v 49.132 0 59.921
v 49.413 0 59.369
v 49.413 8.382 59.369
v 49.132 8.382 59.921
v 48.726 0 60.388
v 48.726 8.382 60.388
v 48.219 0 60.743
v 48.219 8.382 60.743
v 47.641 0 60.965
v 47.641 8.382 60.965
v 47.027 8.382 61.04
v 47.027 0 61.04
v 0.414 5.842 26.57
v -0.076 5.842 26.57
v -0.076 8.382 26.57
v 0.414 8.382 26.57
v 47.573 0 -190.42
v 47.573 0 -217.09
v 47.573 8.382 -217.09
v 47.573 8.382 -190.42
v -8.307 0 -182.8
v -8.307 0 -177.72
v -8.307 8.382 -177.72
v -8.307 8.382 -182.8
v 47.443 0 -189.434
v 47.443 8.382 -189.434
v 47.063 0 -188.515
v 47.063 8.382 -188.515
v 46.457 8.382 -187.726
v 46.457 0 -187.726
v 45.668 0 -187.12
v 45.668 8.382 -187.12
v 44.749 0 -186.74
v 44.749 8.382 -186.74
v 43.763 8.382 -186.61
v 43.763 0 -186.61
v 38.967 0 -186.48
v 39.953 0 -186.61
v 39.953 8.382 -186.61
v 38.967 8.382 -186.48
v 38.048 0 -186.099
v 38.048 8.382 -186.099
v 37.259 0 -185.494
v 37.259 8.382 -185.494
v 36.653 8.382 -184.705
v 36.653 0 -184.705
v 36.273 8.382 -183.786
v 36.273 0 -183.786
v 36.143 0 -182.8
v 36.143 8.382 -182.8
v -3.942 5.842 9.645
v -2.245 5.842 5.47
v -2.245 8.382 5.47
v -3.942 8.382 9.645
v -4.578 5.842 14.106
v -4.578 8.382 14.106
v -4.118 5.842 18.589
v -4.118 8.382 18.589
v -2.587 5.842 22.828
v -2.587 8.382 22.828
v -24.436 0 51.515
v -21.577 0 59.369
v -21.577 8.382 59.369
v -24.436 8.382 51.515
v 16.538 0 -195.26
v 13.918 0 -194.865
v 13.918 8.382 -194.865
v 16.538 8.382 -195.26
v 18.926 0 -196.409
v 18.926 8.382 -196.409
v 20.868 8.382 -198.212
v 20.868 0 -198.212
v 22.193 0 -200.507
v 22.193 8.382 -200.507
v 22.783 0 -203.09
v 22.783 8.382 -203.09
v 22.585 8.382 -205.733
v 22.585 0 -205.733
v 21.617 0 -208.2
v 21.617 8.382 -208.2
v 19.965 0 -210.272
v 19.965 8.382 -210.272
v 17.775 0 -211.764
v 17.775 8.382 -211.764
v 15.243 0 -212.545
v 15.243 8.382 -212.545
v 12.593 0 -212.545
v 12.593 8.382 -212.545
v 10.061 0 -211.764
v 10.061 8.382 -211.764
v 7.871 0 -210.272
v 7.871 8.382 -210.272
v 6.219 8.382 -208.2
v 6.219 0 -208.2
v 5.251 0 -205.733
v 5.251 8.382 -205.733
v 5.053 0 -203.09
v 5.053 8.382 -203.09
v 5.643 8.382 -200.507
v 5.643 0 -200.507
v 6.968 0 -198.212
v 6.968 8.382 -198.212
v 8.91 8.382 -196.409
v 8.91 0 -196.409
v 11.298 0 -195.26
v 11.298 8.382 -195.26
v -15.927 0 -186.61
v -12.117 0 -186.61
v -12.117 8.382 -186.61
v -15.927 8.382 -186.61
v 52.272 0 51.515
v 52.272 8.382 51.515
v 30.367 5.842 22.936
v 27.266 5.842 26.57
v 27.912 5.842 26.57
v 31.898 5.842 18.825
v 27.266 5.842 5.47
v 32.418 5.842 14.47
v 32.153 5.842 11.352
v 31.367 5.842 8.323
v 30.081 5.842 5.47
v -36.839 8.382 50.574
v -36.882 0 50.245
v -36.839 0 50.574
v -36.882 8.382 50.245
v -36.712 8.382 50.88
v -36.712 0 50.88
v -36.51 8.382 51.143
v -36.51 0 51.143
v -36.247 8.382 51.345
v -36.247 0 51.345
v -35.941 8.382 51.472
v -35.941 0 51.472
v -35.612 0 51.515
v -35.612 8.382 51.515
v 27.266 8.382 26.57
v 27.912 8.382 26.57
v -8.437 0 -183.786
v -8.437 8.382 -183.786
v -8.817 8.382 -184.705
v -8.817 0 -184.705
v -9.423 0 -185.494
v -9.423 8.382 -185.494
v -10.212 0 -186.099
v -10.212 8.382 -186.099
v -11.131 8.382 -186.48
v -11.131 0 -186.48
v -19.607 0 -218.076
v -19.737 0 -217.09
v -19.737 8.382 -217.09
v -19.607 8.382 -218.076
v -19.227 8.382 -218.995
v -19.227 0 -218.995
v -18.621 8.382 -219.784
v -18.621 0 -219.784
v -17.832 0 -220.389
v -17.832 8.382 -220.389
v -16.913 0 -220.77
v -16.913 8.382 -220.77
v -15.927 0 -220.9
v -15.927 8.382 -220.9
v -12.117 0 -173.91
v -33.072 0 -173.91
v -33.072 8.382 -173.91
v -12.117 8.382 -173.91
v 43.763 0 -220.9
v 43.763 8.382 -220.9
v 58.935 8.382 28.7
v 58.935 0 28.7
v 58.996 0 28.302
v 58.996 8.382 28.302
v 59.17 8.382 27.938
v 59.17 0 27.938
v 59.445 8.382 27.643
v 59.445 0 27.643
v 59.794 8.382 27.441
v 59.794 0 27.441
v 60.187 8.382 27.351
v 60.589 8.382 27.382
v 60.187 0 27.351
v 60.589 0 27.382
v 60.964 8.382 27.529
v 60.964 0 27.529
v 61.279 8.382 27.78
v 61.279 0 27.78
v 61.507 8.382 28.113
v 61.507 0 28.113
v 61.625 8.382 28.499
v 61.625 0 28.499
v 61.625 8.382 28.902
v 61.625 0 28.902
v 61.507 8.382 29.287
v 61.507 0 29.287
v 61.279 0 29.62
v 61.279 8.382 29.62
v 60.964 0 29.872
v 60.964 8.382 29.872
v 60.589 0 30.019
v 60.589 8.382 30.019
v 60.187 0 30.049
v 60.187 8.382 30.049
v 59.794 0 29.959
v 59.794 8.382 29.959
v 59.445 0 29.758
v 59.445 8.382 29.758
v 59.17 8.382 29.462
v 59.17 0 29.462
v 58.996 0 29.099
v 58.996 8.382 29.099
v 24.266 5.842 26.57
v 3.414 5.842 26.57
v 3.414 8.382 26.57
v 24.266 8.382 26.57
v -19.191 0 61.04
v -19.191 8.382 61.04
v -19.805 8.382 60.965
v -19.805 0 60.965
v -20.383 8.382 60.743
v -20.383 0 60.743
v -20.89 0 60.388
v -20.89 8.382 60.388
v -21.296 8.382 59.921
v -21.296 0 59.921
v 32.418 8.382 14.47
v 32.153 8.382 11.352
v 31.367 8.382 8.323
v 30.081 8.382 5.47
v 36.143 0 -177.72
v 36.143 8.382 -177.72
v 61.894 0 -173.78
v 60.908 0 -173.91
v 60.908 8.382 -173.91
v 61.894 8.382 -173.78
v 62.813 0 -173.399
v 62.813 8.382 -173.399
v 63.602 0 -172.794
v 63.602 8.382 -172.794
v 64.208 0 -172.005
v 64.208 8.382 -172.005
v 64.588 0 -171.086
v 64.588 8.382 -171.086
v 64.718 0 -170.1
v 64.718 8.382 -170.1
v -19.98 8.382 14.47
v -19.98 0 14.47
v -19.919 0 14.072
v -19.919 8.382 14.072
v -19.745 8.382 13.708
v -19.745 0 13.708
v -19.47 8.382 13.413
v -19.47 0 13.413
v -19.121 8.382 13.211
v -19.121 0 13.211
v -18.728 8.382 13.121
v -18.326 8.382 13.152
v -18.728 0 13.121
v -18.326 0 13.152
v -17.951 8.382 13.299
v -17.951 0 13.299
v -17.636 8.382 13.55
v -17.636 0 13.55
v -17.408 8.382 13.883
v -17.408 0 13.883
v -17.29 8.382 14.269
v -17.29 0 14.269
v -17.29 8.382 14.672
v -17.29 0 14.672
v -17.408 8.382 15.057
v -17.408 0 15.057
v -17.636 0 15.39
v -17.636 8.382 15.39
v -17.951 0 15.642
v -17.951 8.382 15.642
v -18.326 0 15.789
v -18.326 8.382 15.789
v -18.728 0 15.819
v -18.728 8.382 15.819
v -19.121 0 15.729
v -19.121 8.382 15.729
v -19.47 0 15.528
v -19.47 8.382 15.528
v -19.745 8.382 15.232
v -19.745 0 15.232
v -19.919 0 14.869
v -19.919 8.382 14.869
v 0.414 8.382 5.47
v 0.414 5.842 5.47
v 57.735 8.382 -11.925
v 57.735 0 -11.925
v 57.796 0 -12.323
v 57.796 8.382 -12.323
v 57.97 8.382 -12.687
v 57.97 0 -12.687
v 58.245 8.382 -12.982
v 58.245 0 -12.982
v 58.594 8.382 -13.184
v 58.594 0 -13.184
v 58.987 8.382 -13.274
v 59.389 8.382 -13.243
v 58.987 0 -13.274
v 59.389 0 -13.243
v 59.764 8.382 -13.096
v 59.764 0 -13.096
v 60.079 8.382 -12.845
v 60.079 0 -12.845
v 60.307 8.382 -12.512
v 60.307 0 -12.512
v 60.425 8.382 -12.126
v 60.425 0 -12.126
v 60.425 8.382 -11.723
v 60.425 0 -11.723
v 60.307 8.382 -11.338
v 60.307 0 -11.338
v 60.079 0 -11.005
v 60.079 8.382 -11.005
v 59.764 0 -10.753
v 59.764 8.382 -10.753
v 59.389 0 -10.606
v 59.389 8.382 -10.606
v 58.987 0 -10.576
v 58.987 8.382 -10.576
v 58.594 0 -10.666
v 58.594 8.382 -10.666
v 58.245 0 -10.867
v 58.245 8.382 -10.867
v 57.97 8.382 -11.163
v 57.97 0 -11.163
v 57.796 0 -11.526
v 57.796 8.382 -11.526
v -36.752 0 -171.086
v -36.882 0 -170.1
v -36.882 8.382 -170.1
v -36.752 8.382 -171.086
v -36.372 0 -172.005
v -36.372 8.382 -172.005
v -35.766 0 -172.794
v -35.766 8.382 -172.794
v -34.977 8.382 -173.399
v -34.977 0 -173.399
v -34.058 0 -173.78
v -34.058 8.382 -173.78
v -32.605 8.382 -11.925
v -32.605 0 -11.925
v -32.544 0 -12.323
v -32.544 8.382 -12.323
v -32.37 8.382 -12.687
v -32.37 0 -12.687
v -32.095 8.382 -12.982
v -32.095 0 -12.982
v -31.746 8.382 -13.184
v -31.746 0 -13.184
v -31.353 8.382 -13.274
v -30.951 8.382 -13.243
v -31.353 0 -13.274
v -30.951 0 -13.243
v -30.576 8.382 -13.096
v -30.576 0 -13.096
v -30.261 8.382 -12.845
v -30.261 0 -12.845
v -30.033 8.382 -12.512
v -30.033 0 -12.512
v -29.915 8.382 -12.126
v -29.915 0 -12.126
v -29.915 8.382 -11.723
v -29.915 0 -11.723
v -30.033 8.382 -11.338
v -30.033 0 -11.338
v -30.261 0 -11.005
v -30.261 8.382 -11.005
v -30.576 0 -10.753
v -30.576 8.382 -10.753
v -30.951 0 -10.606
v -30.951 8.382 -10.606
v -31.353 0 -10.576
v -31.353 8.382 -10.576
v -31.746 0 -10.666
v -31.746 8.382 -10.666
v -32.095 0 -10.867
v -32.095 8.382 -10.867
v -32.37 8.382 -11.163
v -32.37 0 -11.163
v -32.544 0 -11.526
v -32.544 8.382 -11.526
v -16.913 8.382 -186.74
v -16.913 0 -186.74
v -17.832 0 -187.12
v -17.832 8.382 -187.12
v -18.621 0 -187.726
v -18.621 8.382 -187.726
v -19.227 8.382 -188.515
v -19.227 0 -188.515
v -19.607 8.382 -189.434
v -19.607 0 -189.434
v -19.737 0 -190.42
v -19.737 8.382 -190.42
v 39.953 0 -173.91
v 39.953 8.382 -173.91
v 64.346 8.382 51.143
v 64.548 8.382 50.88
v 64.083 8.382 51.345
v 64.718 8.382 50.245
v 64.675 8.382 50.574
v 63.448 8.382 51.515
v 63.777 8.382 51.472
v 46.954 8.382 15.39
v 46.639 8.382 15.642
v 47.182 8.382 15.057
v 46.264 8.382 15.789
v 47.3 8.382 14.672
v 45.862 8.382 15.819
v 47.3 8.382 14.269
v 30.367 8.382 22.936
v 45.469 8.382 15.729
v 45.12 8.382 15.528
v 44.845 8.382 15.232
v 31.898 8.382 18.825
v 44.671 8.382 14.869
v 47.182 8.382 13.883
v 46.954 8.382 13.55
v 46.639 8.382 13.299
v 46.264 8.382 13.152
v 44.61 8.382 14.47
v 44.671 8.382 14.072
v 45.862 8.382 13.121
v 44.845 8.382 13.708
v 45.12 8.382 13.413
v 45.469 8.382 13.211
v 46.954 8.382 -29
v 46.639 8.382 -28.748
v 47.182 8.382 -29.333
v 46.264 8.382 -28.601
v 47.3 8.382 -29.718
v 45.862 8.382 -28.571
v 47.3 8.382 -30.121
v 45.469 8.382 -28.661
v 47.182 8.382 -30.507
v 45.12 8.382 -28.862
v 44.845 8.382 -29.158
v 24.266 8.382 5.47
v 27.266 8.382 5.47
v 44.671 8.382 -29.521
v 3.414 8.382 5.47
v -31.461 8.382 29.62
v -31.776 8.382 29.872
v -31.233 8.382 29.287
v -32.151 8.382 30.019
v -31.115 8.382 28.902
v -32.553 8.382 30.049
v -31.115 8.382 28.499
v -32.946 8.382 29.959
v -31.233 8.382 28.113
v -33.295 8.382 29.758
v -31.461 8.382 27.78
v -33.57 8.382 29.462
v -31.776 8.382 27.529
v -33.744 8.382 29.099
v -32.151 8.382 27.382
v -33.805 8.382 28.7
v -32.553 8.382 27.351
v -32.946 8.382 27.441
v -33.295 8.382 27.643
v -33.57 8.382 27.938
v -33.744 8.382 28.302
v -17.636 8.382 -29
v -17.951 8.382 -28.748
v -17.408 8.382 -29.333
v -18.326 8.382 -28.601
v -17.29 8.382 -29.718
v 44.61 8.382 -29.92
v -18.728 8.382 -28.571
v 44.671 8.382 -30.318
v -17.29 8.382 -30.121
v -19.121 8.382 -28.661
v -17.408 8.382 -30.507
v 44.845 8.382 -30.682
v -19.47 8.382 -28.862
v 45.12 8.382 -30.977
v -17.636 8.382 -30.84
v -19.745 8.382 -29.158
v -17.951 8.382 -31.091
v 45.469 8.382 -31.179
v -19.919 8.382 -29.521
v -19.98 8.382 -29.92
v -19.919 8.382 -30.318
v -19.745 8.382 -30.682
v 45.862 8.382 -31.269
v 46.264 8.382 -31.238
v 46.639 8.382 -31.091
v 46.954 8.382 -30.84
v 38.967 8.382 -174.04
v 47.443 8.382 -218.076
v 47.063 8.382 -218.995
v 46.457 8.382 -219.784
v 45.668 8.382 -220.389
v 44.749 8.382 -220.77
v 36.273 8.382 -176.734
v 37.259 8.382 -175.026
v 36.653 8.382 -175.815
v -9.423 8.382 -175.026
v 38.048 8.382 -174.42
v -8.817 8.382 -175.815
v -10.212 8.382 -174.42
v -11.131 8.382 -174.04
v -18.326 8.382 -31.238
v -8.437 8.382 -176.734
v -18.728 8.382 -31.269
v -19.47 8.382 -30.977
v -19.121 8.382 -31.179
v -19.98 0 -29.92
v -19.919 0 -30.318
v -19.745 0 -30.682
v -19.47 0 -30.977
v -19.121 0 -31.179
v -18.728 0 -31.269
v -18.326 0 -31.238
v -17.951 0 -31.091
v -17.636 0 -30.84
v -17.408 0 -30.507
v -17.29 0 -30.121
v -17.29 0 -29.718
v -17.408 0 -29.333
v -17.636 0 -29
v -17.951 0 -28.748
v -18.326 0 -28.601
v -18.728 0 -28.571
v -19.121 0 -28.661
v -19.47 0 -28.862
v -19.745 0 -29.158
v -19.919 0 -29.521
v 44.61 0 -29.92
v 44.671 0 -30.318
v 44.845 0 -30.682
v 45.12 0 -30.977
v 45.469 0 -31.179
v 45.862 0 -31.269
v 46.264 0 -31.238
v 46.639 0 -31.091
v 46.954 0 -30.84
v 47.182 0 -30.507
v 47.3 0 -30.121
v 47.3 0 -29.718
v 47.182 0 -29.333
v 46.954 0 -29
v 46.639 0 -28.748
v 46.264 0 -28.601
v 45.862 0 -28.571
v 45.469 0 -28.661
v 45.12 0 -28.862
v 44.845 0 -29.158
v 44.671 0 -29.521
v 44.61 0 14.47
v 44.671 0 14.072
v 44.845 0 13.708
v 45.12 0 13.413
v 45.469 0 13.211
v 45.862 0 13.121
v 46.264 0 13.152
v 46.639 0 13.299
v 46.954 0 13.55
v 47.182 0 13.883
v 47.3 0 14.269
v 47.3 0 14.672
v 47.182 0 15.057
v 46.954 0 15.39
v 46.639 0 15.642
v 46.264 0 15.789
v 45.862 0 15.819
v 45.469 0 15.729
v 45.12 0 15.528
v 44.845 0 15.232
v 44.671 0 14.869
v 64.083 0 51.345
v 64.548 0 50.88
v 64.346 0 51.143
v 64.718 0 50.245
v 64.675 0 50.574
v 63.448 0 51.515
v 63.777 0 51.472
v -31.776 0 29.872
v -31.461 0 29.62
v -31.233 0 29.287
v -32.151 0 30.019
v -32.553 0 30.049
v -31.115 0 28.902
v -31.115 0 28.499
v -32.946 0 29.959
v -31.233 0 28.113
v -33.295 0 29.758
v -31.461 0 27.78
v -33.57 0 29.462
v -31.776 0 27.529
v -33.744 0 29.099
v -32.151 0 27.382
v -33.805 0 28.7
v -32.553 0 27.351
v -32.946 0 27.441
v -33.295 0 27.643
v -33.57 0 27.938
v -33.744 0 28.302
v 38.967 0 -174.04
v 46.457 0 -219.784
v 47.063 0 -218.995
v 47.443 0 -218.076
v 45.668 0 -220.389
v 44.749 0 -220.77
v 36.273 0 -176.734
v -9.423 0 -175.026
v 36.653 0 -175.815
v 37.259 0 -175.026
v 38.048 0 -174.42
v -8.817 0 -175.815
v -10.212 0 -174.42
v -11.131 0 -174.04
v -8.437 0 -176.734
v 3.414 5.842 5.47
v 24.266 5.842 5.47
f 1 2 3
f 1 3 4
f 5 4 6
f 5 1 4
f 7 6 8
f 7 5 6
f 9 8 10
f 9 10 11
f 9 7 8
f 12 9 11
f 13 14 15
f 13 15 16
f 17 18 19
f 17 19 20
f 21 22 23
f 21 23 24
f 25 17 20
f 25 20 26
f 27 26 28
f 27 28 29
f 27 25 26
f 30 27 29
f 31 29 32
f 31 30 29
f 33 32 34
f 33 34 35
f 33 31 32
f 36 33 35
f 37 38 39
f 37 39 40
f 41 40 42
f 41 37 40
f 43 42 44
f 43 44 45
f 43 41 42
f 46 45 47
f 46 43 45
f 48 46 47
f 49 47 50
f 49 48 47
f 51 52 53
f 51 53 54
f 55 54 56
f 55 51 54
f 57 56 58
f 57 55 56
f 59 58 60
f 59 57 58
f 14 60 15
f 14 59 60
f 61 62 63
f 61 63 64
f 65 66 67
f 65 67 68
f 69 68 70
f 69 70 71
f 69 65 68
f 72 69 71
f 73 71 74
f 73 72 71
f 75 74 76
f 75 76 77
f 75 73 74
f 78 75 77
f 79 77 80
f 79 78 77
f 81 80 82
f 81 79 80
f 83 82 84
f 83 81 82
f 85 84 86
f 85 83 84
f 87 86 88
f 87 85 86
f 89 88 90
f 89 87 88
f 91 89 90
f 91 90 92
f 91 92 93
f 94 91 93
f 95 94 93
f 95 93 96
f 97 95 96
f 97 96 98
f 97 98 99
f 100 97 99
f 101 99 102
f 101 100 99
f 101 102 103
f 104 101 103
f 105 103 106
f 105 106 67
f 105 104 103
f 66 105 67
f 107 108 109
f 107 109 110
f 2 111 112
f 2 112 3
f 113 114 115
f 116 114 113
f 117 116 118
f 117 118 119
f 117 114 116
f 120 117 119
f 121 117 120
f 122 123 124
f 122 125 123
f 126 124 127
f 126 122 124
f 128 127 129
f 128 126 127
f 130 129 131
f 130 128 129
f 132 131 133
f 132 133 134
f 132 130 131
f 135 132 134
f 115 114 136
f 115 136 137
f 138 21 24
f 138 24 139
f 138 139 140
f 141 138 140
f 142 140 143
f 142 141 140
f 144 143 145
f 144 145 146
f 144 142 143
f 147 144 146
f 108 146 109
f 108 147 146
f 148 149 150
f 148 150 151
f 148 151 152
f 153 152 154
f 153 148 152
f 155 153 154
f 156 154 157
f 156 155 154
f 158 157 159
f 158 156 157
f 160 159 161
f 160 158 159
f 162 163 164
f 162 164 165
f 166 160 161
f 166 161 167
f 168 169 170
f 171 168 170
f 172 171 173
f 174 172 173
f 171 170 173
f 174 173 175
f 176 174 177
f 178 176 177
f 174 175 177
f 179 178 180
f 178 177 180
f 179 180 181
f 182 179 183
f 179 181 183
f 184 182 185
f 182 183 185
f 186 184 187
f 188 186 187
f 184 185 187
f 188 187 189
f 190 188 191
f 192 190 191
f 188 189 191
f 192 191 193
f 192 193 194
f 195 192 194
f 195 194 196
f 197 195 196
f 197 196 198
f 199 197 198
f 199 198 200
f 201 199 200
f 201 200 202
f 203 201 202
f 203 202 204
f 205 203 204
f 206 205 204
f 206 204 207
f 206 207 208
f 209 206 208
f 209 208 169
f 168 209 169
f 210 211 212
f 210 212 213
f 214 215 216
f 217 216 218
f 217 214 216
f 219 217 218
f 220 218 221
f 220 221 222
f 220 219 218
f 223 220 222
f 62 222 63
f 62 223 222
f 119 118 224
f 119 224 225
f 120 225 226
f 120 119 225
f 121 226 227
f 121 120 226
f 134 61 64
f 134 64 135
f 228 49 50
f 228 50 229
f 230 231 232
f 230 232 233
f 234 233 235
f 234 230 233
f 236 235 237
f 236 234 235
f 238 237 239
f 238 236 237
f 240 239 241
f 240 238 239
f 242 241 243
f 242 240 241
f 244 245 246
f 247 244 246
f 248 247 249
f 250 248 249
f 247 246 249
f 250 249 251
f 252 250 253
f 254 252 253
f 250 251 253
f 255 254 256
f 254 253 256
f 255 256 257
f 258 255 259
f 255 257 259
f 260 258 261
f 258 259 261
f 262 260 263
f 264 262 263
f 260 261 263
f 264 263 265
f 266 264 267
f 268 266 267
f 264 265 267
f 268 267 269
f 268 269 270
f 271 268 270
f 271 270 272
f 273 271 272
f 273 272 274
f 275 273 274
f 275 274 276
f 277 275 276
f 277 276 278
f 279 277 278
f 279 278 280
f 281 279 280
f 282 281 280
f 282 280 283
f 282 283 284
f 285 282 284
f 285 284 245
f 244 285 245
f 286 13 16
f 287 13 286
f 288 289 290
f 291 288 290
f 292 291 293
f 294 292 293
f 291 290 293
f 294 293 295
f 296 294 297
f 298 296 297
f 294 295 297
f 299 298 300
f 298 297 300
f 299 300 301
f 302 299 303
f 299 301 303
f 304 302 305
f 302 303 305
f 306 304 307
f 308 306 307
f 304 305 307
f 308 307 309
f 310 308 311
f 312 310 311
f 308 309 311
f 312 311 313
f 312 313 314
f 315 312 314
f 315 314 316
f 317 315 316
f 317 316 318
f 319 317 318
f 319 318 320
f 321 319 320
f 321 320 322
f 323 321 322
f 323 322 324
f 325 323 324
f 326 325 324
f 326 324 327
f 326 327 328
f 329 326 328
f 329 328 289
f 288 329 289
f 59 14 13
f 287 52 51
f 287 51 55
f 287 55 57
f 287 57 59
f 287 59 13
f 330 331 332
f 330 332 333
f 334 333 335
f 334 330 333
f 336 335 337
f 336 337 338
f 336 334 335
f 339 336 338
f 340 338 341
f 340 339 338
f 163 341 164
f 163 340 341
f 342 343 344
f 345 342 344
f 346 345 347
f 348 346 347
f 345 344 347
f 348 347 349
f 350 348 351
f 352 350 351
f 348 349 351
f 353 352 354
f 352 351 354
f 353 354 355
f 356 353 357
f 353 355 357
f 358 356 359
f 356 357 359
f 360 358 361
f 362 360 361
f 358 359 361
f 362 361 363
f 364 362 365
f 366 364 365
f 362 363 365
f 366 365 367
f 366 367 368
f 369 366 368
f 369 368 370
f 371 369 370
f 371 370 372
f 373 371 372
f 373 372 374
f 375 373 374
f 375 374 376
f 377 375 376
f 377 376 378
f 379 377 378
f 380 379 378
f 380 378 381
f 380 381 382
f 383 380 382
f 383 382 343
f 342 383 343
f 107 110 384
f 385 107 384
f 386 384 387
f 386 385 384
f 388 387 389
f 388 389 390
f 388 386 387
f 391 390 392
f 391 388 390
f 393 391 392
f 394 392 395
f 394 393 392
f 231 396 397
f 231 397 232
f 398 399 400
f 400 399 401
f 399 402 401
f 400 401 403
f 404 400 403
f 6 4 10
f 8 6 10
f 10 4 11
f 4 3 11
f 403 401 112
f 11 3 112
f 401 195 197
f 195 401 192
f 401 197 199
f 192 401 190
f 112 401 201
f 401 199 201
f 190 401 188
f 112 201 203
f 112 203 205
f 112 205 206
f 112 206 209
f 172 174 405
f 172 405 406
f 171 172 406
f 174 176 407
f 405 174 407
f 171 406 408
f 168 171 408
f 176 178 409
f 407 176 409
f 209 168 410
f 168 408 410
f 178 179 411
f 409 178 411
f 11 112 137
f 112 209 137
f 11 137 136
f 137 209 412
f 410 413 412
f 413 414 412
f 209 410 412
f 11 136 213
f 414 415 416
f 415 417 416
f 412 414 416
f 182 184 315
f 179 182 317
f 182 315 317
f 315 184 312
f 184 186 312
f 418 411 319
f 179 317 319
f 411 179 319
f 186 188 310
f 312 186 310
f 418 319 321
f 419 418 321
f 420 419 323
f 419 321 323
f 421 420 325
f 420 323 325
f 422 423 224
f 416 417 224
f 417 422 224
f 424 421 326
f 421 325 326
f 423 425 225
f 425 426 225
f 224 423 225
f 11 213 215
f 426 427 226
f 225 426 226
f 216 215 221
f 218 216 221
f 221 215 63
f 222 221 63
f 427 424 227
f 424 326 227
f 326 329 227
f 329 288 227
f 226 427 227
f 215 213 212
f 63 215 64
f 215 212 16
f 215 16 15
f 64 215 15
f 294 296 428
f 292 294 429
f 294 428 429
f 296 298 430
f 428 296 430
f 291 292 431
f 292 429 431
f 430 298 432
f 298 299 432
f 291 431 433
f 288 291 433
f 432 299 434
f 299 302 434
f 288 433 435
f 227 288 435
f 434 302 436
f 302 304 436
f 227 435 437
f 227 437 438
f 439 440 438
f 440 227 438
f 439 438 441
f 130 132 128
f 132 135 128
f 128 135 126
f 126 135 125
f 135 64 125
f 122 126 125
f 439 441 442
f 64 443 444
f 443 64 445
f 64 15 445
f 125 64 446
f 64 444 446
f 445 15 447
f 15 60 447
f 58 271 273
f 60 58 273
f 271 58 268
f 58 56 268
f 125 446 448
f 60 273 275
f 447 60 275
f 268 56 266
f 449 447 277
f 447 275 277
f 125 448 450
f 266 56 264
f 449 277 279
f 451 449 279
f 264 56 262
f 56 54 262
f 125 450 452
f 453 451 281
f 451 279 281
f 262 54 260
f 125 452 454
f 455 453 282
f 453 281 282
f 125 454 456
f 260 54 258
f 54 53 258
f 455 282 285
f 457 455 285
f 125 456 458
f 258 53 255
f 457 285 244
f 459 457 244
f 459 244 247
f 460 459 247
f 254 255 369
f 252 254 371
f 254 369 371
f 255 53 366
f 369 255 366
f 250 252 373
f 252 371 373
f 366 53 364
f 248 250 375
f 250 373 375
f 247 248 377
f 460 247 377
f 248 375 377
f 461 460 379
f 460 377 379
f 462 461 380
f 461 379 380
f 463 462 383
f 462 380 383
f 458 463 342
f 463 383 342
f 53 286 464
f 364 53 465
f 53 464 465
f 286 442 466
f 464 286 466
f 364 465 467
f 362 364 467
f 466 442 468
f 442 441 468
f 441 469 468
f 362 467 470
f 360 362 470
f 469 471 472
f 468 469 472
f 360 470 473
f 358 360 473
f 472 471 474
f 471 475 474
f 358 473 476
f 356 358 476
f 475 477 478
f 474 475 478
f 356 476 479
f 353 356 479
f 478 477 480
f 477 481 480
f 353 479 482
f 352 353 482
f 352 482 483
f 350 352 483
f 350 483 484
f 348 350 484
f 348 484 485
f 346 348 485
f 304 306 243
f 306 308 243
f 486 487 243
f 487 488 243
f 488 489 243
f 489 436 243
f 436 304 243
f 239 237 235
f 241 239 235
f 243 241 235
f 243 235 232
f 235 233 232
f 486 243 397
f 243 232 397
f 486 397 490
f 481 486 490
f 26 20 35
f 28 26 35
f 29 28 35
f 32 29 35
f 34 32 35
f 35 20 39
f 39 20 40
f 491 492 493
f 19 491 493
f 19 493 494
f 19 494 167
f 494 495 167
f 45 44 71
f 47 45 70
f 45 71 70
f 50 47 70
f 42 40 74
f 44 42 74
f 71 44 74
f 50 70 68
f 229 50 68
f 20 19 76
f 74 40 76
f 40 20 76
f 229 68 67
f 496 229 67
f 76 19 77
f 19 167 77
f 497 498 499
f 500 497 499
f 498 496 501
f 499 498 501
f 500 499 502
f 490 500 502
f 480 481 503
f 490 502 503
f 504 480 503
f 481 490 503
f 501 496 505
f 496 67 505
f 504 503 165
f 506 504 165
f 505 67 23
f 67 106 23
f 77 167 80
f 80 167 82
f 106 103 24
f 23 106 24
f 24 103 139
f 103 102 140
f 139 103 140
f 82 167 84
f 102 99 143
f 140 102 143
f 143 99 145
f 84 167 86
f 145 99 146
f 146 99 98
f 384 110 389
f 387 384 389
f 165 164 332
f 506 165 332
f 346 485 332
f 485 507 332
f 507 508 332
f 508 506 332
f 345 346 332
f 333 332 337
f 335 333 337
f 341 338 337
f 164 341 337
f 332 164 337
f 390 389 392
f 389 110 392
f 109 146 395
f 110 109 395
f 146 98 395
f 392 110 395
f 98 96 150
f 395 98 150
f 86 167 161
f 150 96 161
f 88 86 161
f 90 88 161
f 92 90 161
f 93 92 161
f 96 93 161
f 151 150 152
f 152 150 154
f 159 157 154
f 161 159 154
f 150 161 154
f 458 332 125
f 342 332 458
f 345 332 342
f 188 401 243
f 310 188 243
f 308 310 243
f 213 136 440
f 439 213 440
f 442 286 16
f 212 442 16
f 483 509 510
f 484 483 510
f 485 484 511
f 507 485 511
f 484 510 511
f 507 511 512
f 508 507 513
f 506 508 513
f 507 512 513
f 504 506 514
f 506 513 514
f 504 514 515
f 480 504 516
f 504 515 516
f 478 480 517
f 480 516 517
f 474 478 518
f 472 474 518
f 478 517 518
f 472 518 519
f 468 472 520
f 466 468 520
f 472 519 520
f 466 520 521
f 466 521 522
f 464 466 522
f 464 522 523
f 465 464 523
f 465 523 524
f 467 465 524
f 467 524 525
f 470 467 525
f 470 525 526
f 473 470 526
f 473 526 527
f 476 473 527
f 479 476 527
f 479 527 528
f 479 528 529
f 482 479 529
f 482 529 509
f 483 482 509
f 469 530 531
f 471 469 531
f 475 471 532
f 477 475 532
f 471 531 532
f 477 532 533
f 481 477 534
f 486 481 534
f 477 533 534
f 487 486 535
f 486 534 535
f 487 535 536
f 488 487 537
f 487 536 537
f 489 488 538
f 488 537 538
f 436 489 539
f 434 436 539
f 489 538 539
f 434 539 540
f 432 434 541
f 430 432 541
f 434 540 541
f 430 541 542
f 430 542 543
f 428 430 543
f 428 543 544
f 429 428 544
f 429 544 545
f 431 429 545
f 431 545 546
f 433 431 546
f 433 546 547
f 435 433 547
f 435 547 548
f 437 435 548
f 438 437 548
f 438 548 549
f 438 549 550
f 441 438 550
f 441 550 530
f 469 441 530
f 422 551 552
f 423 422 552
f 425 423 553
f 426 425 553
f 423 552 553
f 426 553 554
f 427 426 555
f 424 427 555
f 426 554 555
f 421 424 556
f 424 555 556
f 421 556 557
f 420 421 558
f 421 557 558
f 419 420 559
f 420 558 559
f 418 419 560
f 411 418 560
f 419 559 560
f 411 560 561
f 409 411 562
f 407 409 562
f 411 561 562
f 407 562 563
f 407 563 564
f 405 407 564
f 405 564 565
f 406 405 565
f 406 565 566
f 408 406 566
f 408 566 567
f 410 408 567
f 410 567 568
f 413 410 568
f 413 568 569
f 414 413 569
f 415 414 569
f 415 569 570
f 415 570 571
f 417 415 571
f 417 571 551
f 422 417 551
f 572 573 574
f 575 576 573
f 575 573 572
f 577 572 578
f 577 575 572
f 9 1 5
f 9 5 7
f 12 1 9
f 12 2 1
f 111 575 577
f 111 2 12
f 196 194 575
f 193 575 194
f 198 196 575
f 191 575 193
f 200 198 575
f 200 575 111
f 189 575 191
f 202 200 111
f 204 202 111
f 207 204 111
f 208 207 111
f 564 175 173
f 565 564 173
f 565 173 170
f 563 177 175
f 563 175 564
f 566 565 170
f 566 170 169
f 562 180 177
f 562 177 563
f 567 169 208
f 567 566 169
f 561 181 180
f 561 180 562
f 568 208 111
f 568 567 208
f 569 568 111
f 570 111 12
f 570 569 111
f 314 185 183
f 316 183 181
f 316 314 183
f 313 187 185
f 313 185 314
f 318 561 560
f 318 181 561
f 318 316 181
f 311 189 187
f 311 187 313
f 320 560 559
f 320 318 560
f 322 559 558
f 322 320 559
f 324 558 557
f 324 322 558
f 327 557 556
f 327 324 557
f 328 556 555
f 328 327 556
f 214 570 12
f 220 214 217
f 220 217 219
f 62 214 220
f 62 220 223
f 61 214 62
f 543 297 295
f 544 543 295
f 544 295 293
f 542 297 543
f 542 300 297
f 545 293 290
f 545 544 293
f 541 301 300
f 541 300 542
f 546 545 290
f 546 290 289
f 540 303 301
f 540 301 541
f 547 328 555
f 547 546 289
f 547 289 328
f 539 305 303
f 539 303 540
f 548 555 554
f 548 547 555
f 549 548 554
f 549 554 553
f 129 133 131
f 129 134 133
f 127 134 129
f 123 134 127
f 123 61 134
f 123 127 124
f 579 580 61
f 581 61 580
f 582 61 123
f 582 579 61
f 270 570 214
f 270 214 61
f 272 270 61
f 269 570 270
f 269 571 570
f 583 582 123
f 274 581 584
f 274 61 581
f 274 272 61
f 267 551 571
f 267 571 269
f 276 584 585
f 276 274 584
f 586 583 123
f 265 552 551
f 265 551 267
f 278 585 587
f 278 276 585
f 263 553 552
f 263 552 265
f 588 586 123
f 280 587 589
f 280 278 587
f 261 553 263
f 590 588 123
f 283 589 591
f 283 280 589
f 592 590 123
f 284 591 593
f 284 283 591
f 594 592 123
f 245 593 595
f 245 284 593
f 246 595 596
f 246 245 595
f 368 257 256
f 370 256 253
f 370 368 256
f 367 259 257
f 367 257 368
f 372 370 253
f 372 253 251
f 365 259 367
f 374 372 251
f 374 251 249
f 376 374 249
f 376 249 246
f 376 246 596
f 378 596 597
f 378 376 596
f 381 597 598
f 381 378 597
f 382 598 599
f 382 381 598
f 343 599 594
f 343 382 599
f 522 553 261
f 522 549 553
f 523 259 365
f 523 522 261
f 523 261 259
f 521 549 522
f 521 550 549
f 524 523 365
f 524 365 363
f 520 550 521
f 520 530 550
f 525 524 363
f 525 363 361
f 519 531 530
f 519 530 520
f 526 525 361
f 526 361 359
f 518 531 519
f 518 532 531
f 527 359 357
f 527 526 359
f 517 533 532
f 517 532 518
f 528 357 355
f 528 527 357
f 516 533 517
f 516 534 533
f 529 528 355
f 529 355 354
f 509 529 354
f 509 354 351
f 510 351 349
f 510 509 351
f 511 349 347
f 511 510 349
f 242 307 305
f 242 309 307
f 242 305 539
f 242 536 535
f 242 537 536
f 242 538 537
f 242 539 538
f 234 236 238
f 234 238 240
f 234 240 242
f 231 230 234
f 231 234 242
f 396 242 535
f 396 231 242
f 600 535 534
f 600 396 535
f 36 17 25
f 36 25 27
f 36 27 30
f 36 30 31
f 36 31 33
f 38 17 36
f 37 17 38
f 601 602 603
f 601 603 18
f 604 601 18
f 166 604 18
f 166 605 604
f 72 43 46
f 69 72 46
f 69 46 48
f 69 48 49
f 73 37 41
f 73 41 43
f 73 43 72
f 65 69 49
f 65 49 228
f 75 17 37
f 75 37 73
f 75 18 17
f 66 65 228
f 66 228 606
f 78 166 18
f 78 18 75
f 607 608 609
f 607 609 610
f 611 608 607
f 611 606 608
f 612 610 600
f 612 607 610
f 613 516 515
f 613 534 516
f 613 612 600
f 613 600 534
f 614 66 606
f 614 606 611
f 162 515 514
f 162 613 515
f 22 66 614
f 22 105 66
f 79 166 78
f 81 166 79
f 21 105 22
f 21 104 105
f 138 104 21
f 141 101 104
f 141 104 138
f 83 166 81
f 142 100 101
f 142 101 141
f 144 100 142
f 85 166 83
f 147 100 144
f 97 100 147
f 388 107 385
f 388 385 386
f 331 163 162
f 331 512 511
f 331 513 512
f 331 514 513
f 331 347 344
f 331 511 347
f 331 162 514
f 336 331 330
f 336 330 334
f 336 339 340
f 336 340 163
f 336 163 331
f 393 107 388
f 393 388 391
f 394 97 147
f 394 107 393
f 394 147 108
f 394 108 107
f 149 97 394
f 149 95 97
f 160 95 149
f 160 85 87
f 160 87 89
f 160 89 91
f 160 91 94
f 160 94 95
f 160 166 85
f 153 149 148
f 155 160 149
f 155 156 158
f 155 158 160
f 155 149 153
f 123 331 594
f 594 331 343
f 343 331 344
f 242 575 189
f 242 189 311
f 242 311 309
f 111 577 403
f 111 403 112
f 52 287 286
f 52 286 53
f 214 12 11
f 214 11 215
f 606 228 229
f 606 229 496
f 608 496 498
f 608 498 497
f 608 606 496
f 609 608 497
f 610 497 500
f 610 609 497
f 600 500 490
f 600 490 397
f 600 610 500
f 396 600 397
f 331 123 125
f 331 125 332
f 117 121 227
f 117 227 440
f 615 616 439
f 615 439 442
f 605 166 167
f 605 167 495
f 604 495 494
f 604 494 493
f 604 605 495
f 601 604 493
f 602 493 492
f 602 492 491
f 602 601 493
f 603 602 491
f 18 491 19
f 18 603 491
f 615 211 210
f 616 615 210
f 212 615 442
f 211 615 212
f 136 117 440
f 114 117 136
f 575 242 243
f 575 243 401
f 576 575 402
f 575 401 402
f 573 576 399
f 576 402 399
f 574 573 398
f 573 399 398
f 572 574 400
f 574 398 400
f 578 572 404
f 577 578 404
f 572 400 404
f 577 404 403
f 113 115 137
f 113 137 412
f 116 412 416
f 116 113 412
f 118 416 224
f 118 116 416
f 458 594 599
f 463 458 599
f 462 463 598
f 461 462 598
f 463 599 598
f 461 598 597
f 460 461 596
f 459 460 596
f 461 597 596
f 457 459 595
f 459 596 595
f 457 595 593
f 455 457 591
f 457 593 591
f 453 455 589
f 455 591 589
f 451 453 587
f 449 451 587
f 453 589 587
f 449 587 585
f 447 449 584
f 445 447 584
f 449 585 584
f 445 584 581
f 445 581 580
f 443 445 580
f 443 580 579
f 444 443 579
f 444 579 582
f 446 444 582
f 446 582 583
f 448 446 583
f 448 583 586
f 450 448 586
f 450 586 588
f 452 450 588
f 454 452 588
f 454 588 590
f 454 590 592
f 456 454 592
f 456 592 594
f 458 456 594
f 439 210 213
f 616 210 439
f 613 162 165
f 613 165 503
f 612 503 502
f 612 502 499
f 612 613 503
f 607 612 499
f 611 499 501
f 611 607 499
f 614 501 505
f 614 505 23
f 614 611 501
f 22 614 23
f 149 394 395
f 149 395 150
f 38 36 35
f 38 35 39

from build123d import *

# Parameters (mm, degrees)
SKETCH1_R                 = 8.89
BOSS_EXTRUDE1_DEPTH       = 8.382
FILLET3_R                 = 1.27
TAP_DRILL_FOR_6_32_TAP2_D = 2.7051
LPATTERN1_COUNT           = 2
LPATTERN1_PITCH           = 44.39
LPATTERN1_COUNT_DIR2      = 2
LPATTERN1_PITCH_DIR2      = 64.59
TAP_DRILL_FOR_6_32_TAP3_D = 2.7051
TAP_DRILL_FOR_6_32_TAP5_D = 2.7051
CUT_EXTRUDE2_DEPTH        = 231.337524251
CUT_EXTRUDE2_DEPTH_BACK   = 2.54


with BuildPart() as part:
    # Sketch1 → Boss-Extrude1 (new body)
    with BuildSketch(Plane(origin=(0, 0, 0), x_dir=(1, 0, 0), z_dir=(0, 1, 0))):
        with BuildLine():
            Line((-15.926997076, 220.899744797), (43.763002924, 220.899744797))
            ThreePointArc((43.763002924, 220.899744797), (46.457079761, 219.783821634), (47.573002924, 217.089744797))
            Line((47.573002924, 217.089744797), (47.573002924, 190.419744797))
            ThreePointArc((47.573002924, 190.419744797), (46.457079761, 187.725667961), (43.763002924, 186.609744797))
            Line((43.763002924, 186.609744797), (39.953002924, 186.609744797))
            ThreePointArc((39.953002924, 186.609744797), (37.258926088, 185.493821634), (36.143002924, 182.799744797))
            Line((36.143002924, 182.799744797), (36.143002924, 177.719744797))
            ThreePointArc((36.143002924, 177.719744797), (37.258926088, 175.025667961), (39.953002924, 173.909744797))
            Line((39.953002924, 173.909744797), (60.908002924, 173.909744797))
            ThreePointArc((60.908002924, 173.909744797), (63.602079761, 172.793821634), (64.718002924, 170.099744797))
            Line((64.718002924, 170.099744797), (64.718002924, -51.515255203))
            Line((64.718002924, -51.515255203), (52.272002924, -51.515255203))
            Line((52.272002924, -51.515255203), (49.413478553, -59.368986367))
            ThreePointArc((49.413478553, -59.368986367), (48.483543444, -60.580901395), (47.026659296, -61.040255203))
            Line((47.026659296, -61.040255203), (-19.190653447, -61.040255203))
            ThreePointArc((-19.190653447, -61.040255203), (-20.647537596, -60.580901395), (-21.577472704, -59.368986367))
            Line((-21.577472704, -59.368986367), (-24.435997076, -51.515255203))
            Line((-24.435997076, -51.515255203), (-36.881997076, -51.515255203))
            Line((-36.881997076, -51.515255203), (-36.881997076, 170.099744797))
            ThreePointArc((-36.881997076, 170.099744797), (-35.766073912, 172.793821634), (-33.071997076, 173.909744797))
            Line((-33.071997076, 173.909744797), (-12.116997076, 173.909744797))
            ThreePointArc((-12.116997076, 173.909744797), (-9.422920239, 175.025667961), (-8.306997076, 177.719744797))
            Line((-8.306997076, 177.719744797), (-8.306997076, 182.799744797))
            ThreePointArc((-8.306997076, 182.799744797), (-9.422920239, 185.493821634), (-12.116997076, 186.609744797))
            Line((-12.116997076, 186.609744797), (-15.926997076, 186.609744797))
            ThreePointArc((-15.926997076, 186.609744797), (-18.621073912, 187.725667961), (-19.736997076, 190.419744797))
            Line((-19.736997076, 190.419744797), (-19.736997076, 217.089744797))
            ThreePointArc((-19.736997076, 217.089744797), (-18.621073912, 219.783821634), (-15.926997076, 220.899744797))
        make_face()
        with Locations(Location((13.918002924, 203.754744797, 0), (0, 0, 270))):
            Circle(SKETCH1_R, mode=Mode.SUBTRACT)
    extrude(amount=BOSS_EXTRUDE1_DEPTH)

    # Fillet3
    fillet3_edges = [part.edges().sort_by_distance(p)[0] for p in [
        (-36.881997076, 4.191, 51.515255203),
        (64.718002924, 4.191, 51.515255203),
    ]]
    fillet(fillet3_edges, radius=FILLET3_R)

    # Tap Drill for #6-32 Tap2 (through all)
    with Locations(Plane(origin=(0, 8.382, 0), x_dir=(1, 0, 0), z_dir=(0, 1, 0))):
        with Locations((-18.626997076, -14.470255203)):
            tap_drill_for_6_32_tap2 = Hole(TAP_DRILL_FOR_6_32_TAP2_D / 2)

    # LPattern1: Tap Drill for _6-32 Tap2 2 × 2
    with Locations(*[(j * LPATTERN1_PITCH_DIR2, 0, -i * LPATTERN1_PITCH) for i in range(LPATTERN1_COUNT) for j in range(LPATTERN1_COUNT_DIR2) if (i, j) != (0, 0)]):
        add(tap_drill_for_6_32_tap2, mode=Mode.SUBTRACT)

    # Tap Drill for #6-32 Tap3 (through all)
    with Locations(Plane(origin=(0, 8.382, 0), x_dir=(1, 0, 0), z_dir=(0, 1, 0))):
        with Locations((-31.251997076, 11.924744797), (59.088002924, 11.924744797)):
            Hole(TAP_DRILL_FOR_6_32_TAP3_D / 2)

    # Tap Drill for #6-32 Tap5 (through all)
    with Locations(Plane(origin=(0, 8.382, 0), x_dir=(1, 0, 0), z_dir=(0, 1, 0))):
        with Locations((-32.451997076, -28.700255203), (60.288002924, -28.700255203)):
            Hole(TAP_DRILL_FOR_6_32_TAP5_D / 2)

    # Sketch2 → Cut-Extrude2 (cut, two sides: drawn at the far end of the back side and taken through both)
    with BuildSketch(Plane(origin=(0, 8.382, 0), x_dir=(1, 0, 0), z_dir=(0, 1, 0)).offset(-CUT_EXTRUDE2_DEPTH_BACK)):
        with BuildLine():
            Line((-0.076281623, -26.570255203), (0.413729291, -26.570255203))
            Line((0.413729291, -26.570255203), (0.413729291, -5.470255203))
            Line((0.413729291, -5.470255203), (-2.245226951, -5.470255203))
            ThreePointArc((-2.245226951, -5.470255203), (-4.485024518, -16.361968965), (-0.076281623, -26.570255203))
        make_face()
        Polygon((3.413729291, -26.570255203), (13.918002924, -26.570255203), (24.266068116, -26.570255203), (24.266068116, -5.470255203), (13.918002924, -5.470255203), (3.413729291, -5.470255203), align=None)
        with BuildLine():
            Line((27.266068116, -5.470255203), (27.266068116, -26.570255203))
            Line((27.266068116, -26.570255203), (27.912287472, -26.570255203))
            ThreePointArc((27.912287472, -26.570255203), (31.255019163, -20.926095035), (32.418002924, -14.470255203))
            ThreePointArc((32.418002924, -14.470255203), (31.824283285, -9.821048426), (30.081232799, -5.470255203))
            Line((30.081232799, -5.470255203), (27.266068116, -5.470255203))
        make_face()
    extrude(amount=CUT_EXTRUDE2_DEPTH + CUT_EXTRUDE2_DEPTH_BACK, mode=Mode.SUBTRACT)


solid = part.part
